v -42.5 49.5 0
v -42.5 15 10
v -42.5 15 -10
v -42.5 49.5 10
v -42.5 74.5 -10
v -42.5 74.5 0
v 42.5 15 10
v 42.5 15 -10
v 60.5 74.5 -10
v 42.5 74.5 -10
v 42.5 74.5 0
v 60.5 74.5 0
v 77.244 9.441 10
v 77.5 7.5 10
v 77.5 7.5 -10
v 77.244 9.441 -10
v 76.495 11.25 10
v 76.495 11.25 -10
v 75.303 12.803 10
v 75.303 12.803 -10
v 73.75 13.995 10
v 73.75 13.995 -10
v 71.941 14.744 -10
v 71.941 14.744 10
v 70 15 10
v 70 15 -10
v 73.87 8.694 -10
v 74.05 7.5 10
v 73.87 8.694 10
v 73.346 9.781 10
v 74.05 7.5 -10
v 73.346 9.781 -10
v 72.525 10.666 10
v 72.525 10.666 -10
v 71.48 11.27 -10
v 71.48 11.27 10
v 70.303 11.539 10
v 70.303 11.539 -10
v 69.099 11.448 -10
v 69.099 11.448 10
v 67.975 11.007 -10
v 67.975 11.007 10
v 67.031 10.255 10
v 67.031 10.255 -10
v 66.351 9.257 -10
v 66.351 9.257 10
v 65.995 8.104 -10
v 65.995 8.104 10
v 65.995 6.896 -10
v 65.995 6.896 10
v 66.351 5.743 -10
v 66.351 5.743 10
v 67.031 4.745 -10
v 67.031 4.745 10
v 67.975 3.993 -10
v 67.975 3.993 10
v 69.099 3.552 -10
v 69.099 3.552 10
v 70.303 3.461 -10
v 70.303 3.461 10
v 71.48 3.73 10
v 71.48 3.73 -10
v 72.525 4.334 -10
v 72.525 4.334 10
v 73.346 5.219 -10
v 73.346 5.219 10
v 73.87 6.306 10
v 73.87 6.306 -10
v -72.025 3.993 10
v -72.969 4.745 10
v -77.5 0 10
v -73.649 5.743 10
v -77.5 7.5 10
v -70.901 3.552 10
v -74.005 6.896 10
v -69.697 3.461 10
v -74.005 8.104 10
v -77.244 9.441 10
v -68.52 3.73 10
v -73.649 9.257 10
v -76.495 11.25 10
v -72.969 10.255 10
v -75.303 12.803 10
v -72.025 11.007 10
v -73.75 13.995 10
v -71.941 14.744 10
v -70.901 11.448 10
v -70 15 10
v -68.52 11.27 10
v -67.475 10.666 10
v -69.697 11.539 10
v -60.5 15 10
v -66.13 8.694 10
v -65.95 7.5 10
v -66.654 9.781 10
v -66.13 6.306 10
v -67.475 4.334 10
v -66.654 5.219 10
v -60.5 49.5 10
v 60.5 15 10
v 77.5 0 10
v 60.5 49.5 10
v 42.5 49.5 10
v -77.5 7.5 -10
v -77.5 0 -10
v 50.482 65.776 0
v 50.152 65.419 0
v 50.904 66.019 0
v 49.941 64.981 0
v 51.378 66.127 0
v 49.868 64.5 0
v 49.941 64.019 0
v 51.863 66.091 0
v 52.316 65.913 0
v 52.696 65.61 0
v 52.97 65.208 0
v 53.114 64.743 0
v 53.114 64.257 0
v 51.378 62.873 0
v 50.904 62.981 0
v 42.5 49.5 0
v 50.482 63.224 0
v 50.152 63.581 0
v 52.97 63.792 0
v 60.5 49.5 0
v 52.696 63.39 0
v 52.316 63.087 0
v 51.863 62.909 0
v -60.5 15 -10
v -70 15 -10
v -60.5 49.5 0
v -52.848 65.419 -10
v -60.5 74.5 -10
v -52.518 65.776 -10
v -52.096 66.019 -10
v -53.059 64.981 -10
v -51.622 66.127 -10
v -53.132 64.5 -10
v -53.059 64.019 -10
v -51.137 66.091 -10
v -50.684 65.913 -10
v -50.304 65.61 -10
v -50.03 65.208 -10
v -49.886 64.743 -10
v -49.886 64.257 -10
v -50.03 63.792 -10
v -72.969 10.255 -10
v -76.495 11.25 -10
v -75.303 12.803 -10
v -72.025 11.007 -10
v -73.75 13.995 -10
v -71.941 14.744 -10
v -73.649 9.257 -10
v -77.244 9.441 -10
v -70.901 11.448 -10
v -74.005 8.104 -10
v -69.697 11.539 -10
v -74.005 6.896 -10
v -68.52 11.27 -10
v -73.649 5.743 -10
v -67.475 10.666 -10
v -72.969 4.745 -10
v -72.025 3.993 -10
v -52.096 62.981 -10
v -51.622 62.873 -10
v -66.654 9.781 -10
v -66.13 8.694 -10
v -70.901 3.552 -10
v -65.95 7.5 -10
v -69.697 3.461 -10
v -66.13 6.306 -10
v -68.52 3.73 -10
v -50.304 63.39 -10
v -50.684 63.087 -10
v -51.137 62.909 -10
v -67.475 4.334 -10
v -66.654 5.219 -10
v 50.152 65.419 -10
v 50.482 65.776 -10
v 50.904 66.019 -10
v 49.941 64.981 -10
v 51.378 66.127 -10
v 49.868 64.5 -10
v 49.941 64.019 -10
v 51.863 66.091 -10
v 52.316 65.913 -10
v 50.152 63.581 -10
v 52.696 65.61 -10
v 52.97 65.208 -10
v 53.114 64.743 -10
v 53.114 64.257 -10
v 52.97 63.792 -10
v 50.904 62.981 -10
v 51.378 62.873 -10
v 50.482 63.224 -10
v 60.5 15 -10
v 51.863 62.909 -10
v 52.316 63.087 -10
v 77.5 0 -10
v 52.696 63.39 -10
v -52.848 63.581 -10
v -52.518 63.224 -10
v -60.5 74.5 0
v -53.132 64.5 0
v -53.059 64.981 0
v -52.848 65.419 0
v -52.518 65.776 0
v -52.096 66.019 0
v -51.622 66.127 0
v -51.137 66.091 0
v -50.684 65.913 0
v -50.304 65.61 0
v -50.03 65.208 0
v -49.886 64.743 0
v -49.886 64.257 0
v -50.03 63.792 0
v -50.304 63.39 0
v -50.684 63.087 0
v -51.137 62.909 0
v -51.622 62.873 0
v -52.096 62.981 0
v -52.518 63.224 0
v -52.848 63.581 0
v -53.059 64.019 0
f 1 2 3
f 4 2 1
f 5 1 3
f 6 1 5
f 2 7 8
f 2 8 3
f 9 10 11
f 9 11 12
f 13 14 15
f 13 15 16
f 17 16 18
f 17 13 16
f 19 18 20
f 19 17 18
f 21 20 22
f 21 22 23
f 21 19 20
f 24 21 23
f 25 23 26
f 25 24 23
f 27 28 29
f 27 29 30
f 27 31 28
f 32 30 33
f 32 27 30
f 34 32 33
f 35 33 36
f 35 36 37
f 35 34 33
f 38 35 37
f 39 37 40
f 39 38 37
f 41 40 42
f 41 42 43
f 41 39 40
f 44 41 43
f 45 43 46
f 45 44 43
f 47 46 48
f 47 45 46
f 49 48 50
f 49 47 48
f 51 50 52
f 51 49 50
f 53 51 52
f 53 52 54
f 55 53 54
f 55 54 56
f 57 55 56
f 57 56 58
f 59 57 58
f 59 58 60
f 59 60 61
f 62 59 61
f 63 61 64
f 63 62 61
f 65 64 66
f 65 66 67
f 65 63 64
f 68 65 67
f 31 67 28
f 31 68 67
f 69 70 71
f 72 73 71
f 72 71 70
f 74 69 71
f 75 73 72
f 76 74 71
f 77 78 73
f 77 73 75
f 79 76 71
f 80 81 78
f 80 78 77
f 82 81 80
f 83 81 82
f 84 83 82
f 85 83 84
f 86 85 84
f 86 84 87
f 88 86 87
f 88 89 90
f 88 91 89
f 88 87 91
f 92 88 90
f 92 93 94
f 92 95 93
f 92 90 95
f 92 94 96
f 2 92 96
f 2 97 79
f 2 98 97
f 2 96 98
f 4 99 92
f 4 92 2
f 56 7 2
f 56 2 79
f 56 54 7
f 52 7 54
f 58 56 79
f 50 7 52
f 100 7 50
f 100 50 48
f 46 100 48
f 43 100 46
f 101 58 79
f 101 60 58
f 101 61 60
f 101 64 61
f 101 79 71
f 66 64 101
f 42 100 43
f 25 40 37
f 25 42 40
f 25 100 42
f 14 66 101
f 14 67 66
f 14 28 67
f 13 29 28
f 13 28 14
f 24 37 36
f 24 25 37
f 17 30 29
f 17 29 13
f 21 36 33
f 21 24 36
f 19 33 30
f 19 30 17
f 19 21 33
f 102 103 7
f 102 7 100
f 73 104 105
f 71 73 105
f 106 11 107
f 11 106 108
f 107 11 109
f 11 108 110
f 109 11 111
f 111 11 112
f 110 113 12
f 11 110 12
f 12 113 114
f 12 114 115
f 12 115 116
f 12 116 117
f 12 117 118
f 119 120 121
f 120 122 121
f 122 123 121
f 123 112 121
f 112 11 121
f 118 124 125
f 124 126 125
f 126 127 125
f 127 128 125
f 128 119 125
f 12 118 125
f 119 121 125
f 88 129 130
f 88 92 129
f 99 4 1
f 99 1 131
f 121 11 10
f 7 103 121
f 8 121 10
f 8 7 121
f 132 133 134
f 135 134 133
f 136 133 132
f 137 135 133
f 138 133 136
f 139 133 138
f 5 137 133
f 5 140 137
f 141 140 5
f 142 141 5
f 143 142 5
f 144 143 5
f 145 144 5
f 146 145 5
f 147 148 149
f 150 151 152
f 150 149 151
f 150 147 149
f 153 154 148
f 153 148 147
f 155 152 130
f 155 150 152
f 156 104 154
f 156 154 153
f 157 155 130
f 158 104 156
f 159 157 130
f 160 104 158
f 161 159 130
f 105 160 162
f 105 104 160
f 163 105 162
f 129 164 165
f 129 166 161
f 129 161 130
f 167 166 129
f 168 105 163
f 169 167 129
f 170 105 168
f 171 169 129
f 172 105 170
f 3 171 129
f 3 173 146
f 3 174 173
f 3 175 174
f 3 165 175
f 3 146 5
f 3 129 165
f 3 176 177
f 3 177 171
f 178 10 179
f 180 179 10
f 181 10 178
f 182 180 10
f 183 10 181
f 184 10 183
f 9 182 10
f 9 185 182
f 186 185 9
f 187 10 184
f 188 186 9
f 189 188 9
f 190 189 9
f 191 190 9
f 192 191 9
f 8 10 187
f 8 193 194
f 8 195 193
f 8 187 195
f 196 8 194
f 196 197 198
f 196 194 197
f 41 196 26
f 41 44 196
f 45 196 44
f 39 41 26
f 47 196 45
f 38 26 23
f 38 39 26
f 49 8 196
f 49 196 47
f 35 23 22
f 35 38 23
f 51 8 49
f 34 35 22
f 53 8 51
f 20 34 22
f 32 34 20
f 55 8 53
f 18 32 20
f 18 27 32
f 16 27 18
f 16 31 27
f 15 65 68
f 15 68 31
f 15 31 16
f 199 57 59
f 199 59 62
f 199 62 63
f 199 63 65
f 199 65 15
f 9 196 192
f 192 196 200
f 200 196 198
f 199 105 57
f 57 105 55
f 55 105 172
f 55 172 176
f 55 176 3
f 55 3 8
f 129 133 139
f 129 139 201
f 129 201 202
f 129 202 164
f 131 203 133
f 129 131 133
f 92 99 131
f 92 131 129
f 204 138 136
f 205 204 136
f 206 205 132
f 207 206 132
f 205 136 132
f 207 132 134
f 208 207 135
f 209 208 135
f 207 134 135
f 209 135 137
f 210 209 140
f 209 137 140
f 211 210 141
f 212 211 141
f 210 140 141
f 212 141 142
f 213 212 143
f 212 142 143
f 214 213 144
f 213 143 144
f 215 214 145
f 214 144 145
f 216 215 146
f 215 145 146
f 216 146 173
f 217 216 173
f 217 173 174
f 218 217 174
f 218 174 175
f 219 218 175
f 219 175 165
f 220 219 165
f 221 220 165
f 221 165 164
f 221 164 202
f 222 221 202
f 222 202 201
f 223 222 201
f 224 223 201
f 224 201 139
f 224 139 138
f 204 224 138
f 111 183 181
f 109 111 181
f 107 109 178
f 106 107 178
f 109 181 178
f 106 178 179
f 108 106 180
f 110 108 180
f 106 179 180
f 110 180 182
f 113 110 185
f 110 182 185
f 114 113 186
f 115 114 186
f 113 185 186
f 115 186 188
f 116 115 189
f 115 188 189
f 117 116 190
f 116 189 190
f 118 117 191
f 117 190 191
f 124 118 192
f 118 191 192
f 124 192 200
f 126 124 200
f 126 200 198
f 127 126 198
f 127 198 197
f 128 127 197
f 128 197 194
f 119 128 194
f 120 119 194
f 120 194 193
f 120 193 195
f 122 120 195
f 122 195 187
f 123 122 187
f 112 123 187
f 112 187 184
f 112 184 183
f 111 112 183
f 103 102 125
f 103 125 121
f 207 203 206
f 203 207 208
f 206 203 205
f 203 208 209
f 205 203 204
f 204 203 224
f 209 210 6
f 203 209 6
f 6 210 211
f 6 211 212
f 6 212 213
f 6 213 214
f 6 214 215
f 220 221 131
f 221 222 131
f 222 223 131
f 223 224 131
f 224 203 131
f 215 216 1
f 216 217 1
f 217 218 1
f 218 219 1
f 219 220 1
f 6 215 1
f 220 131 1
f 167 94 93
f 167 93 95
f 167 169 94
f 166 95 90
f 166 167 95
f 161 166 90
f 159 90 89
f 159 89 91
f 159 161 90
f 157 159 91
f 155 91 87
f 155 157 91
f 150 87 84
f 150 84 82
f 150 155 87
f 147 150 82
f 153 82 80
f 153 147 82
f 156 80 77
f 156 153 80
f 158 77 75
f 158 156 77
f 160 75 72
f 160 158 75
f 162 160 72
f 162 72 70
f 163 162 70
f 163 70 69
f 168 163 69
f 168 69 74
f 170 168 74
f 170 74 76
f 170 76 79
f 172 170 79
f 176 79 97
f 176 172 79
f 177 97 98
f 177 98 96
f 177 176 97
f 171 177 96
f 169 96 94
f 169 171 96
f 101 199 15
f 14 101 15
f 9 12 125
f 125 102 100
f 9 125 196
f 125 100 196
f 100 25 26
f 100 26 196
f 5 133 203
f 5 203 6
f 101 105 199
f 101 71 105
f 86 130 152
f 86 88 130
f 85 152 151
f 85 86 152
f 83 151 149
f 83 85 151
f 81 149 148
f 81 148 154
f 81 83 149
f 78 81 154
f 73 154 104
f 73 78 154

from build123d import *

# Parameters (mm, degrees)
SKETCH1_R             = 4.05
BOSS_EXTRUDE1_DEPTH   = 10
SKETCH2_W             = 18
SKETCH2_H             = 10
BOSS_EXTRUDE2_DEPTH   = 25
F_4_CLEARANCE_HOLE1_D = 3.2639


with BuildPart() as part:
    # Sketch1 → Boss-Extrude1 (new, symmetric)
    with BuildSketch(Plane.XY):
        with BuildLine():
            Line((-77.5, 0), (77.5, 0))
            Line((77.5, 0), (77.5, 7.5))
            ThreePointArc((77.5, 7.5), (75.303300859, 12.803300859), (70, 15))
            Line((70, 15), (60.5, 15))
            Line((60.5, 15), (60.5, 49.5))
            Line((60.5, 49.5), (42.5, 49.5))
            Line((42.5, 49.5), (42.5, 15))
            Line((42.5, 15), (-42.5, 15))
            Line((-42.5, 15), (-42.5, 49.5))
            Line((-42.5, 49.5), (-60.5, 49.5))
            Line((-60.5, 49.5), (-60.5, 15))
            Line((-60.5, 15), (-70, 15))
            ThreePointArc((-70, 15), (-75.303300859, 12.803300859), (-77.5, 7.5))
            Line((-77.5, 7.5), (-77.5, 0))
        make_face()
        with Locations((-70, 7.5)):
            Circle(SKETCH1_R, mode=Mode.SUBTRACT)
        with Locations((70, 7.5)):
            Circle(SKETCH1_R, mode=Mode.SUBTRACT)
    extrude(amount=BOSS_EXTRUDE1_DEPTH, both=True)

    # Sketch2 → Boss-Extrude2 (add)
    with BuildSketch(Plane(origin=(0, 49.5, 0), x_dir=(1, 0, 0), z_dir=(0, 1, 0))):
        with Locations((51.5, 5)):
            Rectangle(SKETCH2_W, SKETCH2_H)
        with Locations((-51.5, 5)):
            Rectangle(SKETCH2_W, SKETCH2_H)
    extrude(amount=BOSS_EXTRUDE2_DEPTH)

    # #4 Clearance Hole1 (through all)
    with Locations(Plane.XY):
        with Locations((-51.5, 64.5), (51.5, 64.5)):
            Hole(F_4_CLEARANCE_HOLE1_D / 2)


solid = part.part
